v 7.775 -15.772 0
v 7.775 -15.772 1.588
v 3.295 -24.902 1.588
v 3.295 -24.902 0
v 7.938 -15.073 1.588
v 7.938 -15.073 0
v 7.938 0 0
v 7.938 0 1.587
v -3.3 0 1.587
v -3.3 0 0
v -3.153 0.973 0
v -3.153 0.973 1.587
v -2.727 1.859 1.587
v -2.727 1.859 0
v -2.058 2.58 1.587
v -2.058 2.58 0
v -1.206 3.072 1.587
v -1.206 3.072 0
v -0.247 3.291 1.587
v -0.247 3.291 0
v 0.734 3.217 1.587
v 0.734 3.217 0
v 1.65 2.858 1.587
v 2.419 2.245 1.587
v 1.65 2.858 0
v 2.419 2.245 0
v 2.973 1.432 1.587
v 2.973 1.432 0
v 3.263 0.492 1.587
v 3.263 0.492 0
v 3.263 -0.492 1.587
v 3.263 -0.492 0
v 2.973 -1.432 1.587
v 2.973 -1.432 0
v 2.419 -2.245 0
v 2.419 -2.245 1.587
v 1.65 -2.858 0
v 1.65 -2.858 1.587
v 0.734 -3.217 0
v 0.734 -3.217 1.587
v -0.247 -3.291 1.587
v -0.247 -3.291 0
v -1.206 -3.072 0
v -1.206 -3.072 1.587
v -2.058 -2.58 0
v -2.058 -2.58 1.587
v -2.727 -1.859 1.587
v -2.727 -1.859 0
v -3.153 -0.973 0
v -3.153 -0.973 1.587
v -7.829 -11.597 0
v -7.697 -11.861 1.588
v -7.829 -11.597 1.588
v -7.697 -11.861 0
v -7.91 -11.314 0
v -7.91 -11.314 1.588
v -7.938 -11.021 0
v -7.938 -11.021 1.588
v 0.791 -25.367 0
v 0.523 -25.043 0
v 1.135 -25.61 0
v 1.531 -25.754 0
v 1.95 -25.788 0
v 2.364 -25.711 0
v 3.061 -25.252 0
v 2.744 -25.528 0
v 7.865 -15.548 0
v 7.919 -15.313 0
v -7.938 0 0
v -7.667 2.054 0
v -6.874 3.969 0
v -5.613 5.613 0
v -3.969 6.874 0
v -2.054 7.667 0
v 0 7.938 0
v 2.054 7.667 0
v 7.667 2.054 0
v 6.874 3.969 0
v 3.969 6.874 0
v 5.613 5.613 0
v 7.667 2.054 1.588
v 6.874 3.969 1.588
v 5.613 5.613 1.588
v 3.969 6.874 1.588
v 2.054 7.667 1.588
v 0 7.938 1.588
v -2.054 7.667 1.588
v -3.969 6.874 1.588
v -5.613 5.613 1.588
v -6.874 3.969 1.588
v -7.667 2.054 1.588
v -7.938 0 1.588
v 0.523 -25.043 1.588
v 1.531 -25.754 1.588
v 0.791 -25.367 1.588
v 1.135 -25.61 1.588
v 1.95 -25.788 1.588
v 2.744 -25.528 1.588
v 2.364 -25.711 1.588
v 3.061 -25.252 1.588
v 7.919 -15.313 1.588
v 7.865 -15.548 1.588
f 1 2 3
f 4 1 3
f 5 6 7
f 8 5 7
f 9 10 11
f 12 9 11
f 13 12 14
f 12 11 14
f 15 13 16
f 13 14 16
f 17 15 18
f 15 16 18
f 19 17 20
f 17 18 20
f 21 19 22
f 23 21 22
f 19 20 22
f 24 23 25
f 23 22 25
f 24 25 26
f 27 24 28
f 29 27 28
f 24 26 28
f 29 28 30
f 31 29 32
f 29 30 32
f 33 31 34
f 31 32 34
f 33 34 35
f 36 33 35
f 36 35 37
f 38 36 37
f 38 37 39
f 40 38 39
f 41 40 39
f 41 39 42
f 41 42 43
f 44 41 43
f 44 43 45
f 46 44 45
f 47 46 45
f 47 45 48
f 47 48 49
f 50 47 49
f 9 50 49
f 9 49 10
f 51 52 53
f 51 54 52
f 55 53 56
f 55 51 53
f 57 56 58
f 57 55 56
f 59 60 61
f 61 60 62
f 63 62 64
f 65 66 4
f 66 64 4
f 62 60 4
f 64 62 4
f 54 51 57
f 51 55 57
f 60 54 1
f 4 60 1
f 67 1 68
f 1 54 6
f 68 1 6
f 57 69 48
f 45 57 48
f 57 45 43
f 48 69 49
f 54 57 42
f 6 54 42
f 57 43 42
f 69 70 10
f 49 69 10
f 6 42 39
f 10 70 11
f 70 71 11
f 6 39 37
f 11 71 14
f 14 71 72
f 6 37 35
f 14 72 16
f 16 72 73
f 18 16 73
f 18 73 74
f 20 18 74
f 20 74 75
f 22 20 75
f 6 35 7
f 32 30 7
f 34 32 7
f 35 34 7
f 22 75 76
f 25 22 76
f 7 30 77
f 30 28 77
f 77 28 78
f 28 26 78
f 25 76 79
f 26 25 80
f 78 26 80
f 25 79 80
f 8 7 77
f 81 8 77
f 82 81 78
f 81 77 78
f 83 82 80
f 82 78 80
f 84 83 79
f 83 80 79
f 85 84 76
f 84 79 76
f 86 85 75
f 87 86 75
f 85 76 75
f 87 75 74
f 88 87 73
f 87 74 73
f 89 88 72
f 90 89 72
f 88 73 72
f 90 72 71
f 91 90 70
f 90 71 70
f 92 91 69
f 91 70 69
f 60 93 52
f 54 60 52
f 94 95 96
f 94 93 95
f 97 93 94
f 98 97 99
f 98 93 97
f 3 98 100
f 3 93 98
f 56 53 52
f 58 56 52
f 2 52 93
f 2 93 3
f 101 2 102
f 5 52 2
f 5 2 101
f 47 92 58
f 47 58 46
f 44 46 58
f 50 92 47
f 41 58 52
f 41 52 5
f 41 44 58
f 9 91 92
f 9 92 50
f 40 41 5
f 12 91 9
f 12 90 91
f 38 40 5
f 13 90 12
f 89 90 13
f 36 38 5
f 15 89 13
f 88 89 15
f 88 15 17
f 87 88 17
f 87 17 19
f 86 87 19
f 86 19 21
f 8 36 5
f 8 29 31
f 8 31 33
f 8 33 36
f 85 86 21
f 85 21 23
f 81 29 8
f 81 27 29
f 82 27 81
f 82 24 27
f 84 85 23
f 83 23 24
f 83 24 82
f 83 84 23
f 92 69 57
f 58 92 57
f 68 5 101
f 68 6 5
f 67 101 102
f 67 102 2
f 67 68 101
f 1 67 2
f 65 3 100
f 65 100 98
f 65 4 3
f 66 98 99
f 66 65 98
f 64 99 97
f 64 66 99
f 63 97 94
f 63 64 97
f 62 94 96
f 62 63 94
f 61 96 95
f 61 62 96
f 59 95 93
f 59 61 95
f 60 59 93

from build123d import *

# Parameters (mm, degrees)
SKETCH1_R            = 7.9375
SKETCH1_R_2          = 3
BOSS_EXTRUDE1_DEPTH  = 1.5875
M6_CLEARANCE_HOLE1_D = 6.6
CUT_EXTRUDE1_DEPTH   = 30.699405508
FILLET1_R            = 1.5875


with BuildPart() as part:
    # Sketch1 → Boss-Extrude1 (new body)
    # profile 1 of 3: a face of its own
    with BuildSketch(Plane.XY):
        Circle(SKETCH1_R)
        Circle(SKETCH1_R_2, mode=Mode.SUBTRACT)
    # profile 2 of 3: a face of its own
    with BuildSketch(Plane.XY):
        with BuildLine():
            ThreePointArc((7.9375, 0), (0, -7.9375), (-7.9375, 0))
            Line((-7.9375, 0), (-7.9375, -28.575))
            Line((-7.9375, -28.575), (7.9375, -28.575))
            Line((7.9375, -28.575), (7.9375, 0))
        make_face()
    # profile 3 of 3: a face of its own
    with BuildSketch(Plane.XY):
        Circle(SKETCH1_R_2)
    extrude(amount=BOSS_EXTRUDE1_DEPTH)

    # M6 Clearance Hole1 (through all)
    with Locations(Plane.XY.offset(1.5875)):
        with Locations((0, 0)):
            Hole(M6_CLEARANCE_HOLE1_D / 2)

    # Sketch4 → Cut-Extrude1 (cut, through all)
    with BuildSketch(Plane.XY.offset(1.5875)):
        Polygon((7.9375, -28.575), (7.9375, -15.441016157), (2.035744182, -27.468766371), (-7.9375, -11.475212377), (-7.9375, -28.575), align=None)
    extrude(amount=-CUT_EXTRUDE1_DEPTH, mode=Mode.SUBTRACT)

    # Fillet1
    fillet1_edges = [part.edges().sort_by_distance(p)[0] for p in [
        (-7.9375, -11.475212377, 0.79375),
        (2.035744182, -27.468766371, 0.79375),
        (7.9375, -15.441016157, 0.79375),
    ]]
    fillet(fillet1_edges, radius=FILLET1_R)


solid = part.part
